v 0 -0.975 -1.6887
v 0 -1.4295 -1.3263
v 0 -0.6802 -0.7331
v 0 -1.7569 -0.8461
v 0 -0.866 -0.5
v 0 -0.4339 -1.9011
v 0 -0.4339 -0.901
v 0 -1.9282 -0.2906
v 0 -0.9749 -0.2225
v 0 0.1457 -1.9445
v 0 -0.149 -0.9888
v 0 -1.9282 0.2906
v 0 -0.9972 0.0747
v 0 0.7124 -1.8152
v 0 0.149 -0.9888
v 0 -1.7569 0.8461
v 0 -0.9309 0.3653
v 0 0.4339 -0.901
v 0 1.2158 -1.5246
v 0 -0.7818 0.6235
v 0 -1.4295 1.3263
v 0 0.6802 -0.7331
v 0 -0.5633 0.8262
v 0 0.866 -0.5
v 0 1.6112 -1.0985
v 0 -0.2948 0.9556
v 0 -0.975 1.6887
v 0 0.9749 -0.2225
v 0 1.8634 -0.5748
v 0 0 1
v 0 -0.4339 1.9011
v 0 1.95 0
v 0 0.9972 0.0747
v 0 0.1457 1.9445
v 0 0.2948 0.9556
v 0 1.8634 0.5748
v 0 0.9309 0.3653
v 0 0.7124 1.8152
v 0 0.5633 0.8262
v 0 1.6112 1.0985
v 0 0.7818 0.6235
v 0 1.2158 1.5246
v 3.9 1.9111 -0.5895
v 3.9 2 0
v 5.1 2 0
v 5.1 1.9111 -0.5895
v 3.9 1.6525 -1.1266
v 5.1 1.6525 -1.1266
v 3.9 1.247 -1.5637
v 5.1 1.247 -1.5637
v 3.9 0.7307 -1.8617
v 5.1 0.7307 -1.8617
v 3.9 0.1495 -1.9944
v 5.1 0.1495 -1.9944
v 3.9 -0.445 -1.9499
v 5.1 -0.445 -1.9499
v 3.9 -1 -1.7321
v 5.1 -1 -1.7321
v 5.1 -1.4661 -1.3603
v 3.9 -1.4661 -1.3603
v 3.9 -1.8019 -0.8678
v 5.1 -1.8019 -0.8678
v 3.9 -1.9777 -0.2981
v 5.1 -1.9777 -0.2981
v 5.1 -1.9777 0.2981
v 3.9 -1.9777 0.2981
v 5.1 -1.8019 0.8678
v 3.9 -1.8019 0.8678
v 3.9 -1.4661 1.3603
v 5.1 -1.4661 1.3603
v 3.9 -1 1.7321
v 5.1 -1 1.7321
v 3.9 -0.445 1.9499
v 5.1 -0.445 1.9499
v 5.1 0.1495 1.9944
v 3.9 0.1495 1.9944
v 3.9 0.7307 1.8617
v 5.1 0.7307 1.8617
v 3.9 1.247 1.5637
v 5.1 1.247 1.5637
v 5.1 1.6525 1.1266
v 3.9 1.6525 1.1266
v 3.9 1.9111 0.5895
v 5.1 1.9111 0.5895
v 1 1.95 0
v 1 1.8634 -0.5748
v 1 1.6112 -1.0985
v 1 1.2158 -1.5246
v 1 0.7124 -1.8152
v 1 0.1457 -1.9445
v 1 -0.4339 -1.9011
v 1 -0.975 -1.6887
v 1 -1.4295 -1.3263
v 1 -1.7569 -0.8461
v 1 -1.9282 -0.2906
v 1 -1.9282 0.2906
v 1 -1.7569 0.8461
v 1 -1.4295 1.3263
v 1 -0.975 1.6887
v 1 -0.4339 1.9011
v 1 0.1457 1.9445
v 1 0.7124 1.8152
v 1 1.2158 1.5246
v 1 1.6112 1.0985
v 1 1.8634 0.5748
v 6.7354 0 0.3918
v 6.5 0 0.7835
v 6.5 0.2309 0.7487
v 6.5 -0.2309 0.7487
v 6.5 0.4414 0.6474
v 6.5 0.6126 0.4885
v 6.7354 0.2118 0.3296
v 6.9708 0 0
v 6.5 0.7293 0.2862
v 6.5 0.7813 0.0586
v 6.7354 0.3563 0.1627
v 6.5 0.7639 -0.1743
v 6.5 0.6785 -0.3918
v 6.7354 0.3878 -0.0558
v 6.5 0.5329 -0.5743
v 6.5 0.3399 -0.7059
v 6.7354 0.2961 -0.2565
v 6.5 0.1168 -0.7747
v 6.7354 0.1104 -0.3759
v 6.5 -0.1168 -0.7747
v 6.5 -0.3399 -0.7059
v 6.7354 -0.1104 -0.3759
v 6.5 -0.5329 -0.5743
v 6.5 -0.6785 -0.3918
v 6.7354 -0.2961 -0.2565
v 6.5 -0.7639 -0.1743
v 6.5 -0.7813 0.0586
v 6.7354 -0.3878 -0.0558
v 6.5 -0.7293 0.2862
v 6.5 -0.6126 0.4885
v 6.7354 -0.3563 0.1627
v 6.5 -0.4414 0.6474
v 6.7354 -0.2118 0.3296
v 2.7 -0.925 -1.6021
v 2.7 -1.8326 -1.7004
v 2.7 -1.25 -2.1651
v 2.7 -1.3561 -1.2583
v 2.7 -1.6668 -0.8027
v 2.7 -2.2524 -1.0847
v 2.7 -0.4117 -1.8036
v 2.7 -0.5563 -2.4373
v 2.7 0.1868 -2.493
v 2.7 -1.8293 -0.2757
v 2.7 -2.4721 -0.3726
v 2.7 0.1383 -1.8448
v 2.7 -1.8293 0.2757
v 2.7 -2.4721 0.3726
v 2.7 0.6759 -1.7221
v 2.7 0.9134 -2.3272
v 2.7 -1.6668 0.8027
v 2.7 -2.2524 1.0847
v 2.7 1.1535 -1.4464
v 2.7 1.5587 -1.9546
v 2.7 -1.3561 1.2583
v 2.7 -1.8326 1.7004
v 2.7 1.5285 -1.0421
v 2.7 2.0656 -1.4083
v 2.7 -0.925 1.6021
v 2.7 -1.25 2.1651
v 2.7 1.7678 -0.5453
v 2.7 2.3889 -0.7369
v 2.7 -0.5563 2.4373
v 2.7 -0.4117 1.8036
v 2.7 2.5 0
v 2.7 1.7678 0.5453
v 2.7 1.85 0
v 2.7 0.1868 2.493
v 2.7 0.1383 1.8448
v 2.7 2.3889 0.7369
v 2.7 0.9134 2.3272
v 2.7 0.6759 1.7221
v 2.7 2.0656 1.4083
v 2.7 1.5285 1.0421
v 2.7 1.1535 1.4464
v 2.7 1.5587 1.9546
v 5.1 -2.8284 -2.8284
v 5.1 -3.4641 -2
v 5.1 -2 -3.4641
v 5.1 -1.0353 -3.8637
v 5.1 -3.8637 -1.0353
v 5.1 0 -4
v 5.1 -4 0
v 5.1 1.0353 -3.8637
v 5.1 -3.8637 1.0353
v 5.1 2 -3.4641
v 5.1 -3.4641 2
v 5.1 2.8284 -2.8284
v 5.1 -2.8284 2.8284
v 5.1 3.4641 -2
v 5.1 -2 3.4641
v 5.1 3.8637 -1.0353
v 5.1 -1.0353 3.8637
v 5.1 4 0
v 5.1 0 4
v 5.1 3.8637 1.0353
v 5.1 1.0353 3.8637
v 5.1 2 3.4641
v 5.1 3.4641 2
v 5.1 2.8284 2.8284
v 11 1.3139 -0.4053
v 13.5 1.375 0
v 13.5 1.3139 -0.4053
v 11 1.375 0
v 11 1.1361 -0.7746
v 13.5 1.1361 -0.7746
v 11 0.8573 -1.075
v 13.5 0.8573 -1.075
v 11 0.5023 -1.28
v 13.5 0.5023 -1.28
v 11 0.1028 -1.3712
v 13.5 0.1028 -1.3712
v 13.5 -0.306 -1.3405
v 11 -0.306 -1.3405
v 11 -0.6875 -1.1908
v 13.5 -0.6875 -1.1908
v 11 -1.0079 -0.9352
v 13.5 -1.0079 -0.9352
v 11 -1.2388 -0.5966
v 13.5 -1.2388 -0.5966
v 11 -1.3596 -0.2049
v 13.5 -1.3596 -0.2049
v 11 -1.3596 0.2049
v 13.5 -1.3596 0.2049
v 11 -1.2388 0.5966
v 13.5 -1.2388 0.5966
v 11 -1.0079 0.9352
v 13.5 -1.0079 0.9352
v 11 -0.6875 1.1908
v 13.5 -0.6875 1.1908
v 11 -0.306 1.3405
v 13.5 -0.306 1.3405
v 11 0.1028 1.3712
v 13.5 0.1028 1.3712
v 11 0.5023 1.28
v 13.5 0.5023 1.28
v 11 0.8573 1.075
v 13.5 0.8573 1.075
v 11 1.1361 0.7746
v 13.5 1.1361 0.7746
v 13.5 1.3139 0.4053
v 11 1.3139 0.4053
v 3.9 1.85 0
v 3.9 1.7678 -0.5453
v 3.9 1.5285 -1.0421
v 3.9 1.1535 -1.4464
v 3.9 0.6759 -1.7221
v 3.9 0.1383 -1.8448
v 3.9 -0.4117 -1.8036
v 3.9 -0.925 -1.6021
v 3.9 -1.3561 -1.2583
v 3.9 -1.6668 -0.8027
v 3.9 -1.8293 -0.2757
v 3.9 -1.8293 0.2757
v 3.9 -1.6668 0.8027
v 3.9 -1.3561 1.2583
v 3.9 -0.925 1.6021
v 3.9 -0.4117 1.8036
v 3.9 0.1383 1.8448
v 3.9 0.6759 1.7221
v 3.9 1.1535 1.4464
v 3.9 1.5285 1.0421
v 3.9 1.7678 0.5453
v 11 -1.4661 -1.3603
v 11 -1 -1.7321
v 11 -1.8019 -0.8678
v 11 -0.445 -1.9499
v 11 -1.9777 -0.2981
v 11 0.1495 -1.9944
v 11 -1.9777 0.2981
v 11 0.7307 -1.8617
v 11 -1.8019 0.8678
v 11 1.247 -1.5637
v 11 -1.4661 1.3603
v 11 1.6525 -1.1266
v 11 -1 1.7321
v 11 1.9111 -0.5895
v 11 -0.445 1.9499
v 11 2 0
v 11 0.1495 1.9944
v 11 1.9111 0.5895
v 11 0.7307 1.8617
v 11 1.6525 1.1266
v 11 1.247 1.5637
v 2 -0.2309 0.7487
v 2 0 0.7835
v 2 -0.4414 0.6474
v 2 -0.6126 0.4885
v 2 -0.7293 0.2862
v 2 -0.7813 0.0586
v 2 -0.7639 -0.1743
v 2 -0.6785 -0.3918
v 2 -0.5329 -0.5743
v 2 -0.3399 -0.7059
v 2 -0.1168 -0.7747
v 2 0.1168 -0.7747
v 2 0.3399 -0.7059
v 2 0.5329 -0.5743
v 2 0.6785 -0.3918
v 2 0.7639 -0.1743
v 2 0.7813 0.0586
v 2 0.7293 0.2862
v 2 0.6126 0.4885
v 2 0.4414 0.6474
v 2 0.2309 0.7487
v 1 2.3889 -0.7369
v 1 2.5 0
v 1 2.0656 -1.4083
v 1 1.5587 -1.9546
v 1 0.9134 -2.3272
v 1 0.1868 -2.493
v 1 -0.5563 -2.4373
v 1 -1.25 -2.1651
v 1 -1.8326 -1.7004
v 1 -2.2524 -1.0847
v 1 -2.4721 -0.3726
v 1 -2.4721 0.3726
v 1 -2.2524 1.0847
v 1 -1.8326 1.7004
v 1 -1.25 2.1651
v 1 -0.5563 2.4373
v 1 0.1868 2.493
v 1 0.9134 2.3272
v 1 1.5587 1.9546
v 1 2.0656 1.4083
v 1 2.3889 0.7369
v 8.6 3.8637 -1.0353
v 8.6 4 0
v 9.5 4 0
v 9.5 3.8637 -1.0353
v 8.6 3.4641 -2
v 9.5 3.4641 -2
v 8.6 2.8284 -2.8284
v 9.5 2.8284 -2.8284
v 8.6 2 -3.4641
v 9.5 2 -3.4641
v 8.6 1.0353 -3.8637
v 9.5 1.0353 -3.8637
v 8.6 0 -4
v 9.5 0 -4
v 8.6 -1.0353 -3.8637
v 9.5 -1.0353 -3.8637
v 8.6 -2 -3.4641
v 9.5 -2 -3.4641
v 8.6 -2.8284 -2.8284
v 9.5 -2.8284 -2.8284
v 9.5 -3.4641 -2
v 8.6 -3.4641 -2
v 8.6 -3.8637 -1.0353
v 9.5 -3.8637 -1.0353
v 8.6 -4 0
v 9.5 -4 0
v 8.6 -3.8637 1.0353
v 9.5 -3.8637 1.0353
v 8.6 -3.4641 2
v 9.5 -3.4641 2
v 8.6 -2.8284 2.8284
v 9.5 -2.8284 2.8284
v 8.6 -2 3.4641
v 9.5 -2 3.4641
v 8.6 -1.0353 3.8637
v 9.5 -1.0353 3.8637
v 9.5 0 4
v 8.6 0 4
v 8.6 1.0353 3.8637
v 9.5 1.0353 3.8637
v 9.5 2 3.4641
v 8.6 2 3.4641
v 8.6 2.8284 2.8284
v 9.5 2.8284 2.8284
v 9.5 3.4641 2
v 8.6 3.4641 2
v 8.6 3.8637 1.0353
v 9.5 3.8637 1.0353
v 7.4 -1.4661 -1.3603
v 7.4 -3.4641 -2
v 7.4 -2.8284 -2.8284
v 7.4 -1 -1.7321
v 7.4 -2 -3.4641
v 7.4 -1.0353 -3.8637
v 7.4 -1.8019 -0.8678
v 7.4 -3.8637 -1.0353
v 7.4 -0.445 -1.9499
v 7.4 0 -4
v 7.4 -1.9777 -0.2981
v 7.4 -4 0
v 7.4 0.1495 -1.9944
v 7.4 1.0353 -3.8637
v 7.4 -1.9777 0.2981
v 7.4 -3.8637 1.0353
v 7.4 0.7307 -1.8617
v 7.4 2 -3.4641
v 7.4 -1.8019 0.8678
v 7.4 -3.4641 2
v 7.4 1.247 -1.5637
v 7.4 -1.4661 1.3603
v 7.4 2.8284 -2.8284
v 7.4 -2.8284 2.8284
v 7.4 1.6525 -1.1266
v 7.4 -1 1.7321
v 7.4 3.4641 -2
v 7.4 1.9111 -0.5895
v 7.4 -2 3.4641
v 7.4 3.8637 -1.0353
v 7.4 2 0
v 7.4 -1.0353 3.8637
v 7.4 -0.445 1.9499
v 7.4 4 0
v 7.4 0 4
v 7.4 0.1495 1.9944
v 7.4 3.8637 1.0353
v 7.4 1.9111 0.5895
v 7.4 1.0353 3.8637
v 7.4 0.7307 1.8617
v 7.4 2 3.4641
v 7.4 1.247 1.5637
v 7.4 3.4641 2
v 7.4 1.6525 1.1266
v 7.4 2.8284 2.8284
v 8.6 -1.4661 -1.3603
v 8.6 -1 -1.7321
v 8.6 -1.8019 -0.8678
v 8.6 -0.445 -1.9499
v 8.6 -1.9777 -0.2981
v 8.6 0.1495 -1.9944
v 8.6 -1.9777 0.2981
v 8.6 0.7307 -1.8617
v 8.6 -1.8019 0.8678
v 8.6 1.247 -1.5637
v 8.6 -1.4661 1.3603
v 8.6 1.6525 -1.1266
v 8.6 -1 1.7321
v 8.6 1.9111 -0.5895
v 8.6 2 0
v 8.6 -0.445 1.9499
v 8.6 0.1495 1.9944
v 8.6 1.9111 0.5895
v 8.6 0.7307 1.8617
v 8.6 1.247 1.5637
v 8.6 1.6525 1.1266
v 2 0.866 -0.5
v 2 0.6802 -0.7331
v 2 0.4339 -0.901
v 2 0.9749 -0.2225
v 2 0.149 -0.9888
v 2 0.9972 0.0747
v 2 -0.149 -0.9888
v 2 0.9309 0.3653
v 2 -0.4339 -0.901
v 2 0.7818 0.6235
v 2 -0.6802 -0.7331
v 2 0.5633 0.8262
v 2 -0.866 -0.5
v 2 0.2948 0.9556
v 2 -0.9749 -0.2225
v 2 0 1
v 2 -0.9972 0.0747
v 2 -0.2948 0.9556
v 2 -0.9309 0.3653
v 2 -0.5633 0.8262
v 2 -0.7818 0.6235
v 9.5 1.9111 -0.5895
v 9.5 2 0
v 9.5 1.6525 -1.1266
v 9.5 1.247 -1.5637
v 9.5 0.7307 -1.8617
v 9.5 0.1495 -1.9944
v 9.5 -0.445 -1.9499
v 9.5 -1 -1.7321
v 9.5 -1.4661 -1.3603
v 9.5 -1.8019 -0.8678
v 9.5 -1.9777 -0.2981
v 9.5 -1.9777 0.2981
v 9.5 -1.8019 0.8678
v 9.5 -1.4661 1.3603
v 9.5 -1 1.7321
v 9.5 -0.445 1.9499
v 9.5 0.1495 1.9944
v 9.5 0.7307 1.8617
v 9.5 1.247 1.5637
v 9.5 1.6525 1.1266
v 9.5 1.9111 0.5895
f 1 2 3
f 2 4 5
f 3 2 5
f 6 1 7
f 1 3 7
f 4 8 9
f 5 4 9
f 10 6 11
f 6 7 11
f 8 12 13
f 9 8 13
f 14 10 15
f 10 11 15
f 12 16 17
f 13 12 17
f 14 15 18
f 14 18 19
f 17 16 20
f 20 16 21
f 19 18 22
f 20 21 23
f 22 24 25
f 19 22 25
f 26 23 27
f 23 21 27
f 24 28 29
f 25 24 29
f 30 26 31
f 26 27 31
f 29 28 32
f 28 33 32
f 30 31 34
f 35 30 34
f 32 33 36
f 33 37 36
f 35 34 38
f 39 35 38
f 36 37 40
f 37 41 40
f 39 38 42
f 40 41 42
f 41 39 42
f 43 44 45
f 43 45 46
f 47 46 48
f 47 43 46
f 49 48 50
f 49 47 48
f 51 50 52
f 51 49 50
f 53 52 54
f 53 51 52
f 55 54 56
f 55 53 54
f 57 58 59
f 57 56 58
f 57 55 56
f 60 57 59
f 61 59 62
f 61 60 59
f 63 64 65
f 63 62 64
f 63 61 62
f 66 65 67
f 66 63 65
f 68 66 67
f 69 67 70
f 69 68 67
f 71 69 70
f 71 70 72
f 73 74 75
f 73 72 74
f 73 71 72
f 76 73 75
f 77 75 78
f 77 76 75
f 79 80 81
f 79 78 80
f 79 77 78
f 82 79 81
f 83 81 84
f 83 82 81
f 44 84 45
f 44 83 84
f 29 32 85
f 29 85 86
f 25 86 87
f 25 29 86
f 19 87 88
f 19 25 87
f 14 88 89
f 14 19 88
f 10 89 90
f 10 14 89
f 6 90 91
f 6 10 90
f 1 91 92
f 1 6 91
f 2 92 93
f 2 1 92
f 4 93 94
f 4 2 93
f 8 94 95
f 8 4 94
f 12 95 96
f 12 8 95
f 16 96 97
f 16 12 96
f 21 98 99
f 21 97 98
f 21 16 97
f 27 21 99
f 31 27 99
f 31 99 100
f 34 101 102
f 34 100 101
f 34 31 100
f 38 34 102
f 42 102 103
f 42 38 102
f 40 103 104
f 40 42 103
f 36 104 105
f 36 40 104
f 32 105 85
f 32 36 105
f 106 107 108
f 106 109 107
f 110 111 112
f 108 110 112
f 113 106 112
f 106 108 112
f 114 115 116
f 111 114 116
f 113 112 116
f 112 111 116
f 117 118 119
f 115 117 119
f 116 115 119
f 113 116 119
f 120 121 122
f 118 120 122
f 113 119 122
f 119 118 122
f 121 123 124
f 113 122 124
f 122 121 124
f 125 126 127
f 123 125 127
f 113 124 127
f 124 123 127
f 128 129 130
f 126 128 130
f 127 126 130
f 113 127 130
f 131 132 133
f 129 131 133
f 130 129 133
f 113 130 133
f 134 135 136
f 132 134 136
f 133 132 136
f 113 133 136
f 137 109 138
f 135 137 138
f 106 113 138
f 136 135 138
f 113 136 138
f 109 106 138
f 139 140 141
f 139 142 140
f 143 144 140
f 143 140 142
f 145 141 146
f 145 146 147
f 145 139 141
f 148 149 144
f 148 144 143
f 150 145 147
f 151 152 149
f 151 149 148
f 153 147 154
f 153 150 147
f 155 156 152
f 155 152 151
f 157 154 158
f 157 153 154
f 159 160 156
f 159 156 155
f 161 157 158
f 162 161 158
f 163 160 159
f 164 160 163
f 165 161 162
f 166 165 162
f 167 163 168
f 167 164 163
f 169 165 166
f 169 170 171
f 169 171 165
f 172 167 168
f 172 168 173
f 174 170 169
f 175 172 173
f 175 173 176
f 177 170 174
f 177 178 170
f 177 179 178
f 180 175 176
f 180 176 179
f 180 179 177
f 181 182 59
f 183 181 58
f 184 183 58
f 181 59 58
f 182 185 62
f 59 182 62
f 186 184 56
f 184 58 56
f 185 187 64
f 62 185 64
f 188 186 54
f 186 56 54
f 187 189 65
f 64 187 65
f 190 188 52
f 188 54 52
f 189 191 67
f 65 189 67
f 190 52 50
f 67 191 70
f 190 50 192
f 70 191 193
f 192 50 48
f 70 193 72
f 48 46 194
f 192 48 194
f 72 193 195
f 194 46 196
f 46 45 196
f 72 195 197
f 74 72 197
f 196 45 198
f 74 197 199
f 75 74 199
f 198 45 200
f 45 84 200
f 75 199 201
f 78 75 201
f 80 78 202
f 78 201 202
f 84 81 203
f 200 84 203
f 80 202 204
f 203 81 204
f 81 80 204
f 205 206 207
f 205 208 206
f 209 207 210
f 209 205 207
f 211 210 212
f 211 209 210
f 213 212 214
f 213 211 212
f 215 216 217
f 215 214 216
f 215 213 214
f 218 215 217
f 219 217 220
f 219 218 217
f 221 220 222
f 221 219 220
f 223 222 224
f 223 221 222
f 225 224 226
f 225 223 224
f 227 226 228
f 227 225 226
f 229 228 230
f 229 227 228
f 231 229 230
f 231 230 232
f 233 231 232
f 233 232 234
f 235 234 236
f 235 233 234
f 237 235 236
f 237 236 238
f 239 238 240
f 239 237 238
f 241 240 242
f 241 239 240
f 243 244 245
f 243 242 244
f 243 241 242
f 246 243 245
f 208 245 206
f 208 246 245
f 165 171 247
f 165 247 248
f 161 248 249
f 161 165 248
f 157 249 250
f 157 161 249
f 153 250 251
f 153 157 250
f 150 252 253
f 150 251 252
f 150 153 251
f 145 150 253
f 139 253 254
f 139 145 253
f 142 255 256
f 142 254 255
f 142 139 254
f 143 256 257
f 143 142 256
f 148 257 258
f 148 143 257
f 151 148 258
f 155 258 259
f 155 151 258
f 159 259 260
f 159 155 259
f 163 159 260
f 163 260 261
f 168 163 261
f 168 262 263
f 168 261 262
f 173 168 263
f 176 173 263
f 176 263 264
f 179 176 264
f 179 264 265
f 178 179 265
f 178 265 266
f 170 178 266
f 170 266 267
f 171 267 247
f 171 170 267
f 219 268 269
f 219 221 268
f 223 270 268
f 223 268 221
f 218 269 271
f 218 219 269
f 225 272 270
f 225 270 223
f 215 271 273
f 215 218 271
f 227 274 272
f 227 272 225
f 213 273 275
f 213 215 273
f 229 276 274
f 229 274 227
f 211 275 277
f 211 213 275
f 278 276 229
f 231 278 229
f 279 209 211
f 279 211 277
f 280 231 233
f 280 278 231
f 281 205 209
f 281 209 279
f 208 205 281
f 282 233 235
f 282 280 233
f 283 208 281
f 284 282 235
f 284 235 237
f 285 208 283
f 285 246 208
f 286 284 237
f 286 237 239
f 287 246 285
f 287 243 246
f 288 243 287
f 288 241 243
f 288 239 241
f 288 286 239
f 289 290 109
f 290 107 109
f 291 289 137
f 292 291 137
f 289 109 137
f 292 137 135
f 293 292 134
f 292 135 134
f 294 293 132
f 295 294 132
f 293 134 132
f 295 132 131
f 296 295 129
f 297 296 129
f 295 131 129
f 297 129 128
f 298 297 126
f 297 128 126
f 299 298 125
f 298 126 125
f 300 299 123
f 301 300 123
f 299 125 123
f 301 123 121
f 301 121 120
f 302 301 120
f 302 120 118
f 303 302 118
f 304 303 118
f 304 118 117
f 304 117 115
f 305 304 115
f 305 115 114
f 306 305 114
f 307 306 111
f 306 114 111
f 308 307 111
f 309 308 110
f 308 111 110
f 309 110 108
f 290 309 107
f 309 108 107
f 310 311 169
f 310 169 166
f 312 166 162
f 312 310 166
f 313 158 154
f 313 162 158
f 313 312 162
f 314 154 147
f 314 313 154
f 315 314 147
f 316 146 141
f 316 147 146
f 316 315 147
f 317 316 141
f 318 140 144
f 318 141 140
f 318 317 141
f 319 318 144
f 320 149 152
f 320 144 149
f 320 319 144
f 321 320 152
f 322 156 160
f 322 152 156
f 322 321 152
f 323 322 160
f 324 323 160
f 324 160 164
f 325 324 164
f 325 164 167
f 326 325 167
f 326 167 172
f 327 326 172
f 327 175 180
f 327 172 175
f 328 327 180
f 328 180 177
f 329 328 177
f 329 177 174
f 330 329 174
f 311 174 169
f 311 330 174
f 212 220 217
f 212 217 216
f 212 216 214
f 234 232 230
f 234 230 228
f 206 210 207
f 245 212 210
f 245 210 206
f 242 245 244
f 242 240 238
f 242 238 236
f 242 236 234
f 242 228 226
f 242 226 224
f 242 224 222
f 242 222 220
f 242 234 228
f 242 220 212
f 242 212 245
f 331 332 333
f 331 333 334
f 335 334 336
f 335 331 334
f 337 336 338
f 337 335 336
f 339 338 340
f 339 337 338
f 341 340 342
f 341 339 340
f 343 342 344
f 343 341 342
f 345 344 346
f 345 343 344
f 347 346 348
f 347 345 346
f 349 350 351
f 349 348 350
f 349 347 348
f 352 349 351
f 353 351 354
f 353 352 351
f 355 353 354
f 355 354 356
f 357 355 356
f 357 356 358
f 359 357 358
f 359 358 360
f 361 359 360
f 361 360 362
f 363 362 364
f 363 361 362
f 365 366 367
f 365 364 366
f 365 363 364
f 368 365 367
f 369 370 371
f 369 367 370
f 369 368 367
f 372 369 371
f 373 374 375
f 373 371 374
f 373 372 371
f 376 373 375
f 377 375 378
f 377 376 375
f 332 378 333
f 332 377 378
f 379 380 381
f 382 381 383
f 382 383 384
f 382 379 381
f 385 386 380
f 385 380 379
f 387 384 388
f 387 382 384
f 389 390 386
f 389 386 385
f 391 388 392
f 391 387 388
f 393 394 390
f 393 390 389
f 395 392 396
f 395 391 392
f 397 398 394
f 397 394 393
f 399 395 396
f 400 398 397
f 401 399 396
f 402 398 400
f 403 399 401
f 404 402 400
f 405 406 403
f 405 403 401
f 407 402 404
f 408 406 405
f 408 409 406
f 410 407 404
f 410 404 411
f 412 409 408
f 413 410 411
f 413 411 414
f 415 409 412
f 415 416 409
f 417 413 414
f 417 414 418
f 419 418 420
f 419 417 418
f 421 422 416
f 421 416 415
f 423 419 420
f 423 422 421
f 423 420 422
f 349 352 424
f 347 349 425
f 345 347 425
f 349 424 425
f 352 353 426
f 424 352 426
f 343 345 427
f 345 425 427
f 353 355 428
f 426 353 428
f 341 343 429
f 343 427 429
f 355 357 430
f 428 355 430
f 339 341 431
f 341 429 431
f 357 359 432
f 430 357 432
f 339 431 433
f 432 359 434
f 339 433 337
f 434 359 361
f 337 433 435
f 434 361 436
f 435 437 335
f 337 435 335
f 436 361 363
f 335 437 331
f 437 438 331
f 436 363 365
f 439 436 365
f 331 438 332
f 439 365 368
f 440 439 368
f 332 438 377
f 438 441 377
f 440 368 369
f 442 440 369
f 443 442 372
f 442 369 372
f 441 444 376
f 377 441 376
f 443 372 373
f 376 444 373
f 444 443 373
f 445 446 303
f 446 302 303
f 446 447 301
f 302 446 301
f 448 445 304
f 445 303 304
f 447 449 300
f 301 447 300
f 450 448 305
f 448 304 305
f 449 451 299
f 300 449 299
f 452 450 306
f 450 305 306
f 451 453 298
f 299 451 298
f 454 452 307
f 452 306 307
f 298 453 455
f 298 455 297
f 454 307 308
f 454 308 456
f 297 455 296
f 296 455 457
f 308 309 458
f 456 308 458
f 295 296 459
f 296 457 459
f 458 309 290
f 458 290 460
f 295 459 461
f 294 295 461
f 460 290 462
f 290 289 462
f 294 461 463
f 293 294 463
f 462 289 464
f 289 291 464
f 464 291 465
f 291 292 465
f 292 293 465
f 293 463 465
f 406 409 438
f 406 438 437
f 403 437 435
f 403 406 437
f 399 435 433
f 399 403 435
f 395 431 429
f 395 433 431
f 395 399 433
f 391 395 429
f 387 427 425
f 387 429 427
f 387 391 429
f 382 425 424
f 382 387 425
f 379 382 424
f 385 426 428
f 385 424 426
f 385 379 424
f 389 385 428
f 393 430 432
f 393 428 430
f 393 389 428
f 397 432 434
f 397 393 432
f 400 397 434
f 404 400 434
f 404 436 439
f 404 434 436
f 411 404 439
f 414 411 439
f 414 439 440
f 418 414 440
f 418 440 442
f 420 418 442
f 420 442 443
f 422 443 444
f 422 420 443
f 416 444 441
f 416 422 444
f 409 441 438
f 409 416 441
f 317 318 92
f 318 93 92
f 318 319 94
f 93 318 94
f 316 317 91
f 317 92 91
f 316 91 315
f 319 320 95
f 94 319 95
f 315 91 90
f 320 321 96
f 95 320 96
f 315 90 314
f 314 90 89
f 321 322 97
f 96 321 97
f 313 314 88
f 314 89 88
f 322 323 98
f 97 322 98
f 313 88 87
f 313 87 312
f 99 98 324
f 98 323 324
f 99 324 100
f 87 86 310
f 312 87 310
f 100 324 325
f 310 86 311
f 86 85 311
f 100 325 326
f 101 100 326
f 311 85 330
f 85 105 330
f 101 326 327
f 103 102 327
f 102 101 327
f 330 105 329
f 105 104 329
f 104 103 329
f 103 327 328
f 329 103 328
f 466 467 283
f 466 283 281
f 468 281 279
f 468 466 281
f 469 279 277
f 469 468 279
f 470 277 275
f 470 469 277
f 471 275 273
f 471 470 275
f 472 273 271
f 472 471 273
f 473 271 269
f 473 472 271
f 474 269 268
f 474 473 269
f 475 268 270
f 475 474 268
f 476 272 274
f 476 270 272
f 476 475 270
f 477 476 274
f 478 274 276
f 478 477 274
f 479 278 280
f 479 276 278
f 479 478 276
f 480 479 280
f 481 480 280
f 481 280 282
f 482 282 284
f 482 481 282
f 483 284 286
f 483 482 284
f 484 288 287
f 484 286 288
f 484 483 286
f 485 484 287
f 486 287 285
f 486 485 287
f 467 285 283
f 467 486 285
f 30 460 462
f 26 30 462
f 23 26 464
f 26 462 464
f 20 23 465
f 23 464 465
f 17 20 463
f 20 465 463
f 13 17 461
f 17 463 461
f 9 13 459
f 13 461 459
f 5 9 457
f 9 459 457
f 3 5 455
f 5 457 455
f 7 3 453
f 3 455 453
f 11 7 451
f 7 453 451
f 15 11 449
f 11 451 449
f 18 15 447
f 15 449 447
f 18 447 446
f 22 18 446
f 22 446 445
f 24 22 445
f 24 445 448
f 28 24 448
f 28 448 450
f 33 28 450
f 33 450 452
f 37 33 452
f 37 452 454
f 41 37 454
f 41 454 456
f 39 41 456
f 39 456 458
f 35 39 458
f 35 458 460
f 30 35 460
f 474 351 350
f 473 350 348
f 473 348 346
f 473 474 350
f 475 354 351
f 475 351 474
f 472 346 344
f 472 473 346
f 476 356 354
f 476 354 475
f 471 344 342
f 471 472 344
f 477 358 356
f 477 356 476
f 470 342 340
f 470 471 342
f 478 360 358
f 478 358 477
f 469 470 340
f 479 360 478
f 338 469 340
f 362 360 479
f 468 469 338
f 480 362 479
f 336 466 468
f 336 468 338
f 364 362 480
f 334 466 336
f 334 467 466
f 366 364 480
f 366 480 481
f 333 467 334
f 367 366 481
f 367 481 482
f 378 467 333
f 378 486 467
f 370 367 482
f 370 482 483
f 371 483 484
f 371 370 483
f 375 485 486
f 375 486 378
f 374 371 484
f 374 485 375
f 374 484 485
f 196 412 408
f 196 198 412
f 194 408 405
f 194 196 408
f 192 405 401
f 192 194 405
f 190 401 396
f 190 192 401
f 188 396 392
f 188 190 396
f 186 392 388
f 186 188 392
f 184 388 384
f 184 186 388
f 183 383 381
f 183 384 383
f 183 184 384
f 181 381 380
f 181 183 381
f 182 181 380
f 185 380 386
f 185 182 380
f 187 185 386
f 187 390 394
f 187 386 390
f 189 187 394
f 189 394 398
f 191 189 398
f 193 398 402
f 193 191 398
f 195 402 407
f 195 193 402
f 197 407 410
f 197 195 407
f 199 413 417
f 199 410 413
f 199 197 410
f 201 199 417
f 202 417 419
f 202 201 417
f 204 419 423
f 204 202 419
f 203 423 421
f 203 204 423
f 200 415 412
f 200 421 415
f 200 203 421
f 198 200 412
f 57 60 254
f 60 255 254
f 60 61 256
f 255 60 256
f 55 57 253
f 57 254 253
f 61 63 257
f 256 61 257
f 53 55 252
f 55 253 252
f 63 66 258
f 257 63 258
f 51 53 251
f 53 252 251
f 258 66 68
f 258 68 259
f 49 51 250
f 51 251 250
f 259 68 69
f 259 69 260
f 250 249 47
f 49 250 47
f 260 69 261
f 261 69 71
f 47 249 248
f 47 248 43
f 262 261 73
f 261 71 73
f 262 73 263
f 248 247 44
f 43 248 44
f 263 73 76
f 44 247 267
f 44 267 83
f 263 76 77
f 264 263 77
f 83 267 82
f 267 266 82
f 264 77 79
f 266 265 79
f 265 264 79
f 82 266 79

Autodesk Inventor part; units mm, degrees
ref_plane "YZ Plane" through (0, 0, 0) normal (1, 0, 0) x (0, 1, 0)
ref_plane "XZ Plane" through (0, 0, 0) normal (0, 1, 0) x (-1, 0, 0)
ref_plane "XY Plane" through (0, 0, 0) normal (0, 0, 1) x (1, 0, 0)
sketch "Sketch1" plane through (0, 0, 0) normal (0, 0, 1) x (1, 0, 0)
  line L0 (0, 0) -> (1, 0)
  line L1 (1, 0) -> (1, 1.95)
  line L2 (1, 1.95) -> (0, 1.95)
  line L3 (0, 1.95) -> (0, 0)
  line L4 (1, 0) -> (2.7, 0)
  line L5 (2.7, 0) -> (2.7, 2.5)
  line L6 (2.7, 2.5) -> (1, 2.5)
  line L7 (1, 2.5) -> (1, 0)
  line L8 (2.7, 0) -> (3.9, 0)
  line L9 (3.9, 0) -> (3.9, 1.85)
  line L10 (3.9, 1.85) -> (2.7, 1.85)
  line L11 (2.7, 1.85) -> (2.7, 0)
  line L12 (3.9, 0) -> (5.1, 0)
  line L13 (5.1, 0) -> (5.1, 2)
  line L14 (5.1, 2) -> (3.9, 2)
  line L15 (3.9, 2) -> (3.9, 0)
  line L16 (5.1, 0) -> (7.4, 0)
  line L17 (7.4, 0) -> (7.4, 4)
  line L18 (7.4, 4) -> (5.1, 4)
  line L19 (5.1, 4) -> (5.1, 0)
  line L20 (7.4, 0) -> (8.6, 0)
  line L21 (8.6, 0) -> (8.6, 2)
  line L22 (8.6, 2) -> (7.4, 2)
  line L23 (7.4, 2) -> (7.4, 0)
  line L24 (8.6, 0) -> (9.5, 0)
  line L25 (9.5, 0) -> (9.5, 4)
  line L26 (9.5, 4) -> (8.6, 4)
  line L27 (8.6, 4) -> (8.6, 0)
  line L28 (9.5, 0) -> (11, 0)
  line L29 (11, 0) -> (11, 2)
  line L30 (11, 2) -> (9.5, 2)
  line L31 (9.5, 2) -> (9.5, 0)
  line L32 (11, 0) -> (13.5, 0)
  line L33 (13.5, 0) -> (13.5, 1.375)
  line L34 (13.5, 1.375) -> (11, 1.375)
  line L35 (11, 1.375) -> (11, 0)
  dimension "d0" = 2.75
  dimension "d1" = 13.5
  dimension "d2" = 4
  dimension "d3" = 3.7
  dimension "d4" = 3.9
  dimension "d5" = 8
  dimension "d6" = 4
  dimension "d7" = 1
  dimension "d8" = 2.7
  dimension "d9" = 11
  dimension "d10" = 9.5
  dimension "d11" = 8.6
  dimension "d12" = 7.4
  dimension "d13" = 5.1
  dimension "d14" = 3.9
  dimension "d25" = 5
revolve "Revolution1" add sketch "Sketch1" angle 360 about axis through (0, 0, 0) along (1, 0, 0)
hole "Hole1" at (0, 0, 0) direction (1, 0, 0) diameter 1.567 depth 6.5 tip angle 118 counterbore diameter 2 counterbore depth 2 thread size "M2x0.4" class "6H" standard "ANSI Metric M Profile"
properties part number "403-10" material "Brass, Soft Yellow"
